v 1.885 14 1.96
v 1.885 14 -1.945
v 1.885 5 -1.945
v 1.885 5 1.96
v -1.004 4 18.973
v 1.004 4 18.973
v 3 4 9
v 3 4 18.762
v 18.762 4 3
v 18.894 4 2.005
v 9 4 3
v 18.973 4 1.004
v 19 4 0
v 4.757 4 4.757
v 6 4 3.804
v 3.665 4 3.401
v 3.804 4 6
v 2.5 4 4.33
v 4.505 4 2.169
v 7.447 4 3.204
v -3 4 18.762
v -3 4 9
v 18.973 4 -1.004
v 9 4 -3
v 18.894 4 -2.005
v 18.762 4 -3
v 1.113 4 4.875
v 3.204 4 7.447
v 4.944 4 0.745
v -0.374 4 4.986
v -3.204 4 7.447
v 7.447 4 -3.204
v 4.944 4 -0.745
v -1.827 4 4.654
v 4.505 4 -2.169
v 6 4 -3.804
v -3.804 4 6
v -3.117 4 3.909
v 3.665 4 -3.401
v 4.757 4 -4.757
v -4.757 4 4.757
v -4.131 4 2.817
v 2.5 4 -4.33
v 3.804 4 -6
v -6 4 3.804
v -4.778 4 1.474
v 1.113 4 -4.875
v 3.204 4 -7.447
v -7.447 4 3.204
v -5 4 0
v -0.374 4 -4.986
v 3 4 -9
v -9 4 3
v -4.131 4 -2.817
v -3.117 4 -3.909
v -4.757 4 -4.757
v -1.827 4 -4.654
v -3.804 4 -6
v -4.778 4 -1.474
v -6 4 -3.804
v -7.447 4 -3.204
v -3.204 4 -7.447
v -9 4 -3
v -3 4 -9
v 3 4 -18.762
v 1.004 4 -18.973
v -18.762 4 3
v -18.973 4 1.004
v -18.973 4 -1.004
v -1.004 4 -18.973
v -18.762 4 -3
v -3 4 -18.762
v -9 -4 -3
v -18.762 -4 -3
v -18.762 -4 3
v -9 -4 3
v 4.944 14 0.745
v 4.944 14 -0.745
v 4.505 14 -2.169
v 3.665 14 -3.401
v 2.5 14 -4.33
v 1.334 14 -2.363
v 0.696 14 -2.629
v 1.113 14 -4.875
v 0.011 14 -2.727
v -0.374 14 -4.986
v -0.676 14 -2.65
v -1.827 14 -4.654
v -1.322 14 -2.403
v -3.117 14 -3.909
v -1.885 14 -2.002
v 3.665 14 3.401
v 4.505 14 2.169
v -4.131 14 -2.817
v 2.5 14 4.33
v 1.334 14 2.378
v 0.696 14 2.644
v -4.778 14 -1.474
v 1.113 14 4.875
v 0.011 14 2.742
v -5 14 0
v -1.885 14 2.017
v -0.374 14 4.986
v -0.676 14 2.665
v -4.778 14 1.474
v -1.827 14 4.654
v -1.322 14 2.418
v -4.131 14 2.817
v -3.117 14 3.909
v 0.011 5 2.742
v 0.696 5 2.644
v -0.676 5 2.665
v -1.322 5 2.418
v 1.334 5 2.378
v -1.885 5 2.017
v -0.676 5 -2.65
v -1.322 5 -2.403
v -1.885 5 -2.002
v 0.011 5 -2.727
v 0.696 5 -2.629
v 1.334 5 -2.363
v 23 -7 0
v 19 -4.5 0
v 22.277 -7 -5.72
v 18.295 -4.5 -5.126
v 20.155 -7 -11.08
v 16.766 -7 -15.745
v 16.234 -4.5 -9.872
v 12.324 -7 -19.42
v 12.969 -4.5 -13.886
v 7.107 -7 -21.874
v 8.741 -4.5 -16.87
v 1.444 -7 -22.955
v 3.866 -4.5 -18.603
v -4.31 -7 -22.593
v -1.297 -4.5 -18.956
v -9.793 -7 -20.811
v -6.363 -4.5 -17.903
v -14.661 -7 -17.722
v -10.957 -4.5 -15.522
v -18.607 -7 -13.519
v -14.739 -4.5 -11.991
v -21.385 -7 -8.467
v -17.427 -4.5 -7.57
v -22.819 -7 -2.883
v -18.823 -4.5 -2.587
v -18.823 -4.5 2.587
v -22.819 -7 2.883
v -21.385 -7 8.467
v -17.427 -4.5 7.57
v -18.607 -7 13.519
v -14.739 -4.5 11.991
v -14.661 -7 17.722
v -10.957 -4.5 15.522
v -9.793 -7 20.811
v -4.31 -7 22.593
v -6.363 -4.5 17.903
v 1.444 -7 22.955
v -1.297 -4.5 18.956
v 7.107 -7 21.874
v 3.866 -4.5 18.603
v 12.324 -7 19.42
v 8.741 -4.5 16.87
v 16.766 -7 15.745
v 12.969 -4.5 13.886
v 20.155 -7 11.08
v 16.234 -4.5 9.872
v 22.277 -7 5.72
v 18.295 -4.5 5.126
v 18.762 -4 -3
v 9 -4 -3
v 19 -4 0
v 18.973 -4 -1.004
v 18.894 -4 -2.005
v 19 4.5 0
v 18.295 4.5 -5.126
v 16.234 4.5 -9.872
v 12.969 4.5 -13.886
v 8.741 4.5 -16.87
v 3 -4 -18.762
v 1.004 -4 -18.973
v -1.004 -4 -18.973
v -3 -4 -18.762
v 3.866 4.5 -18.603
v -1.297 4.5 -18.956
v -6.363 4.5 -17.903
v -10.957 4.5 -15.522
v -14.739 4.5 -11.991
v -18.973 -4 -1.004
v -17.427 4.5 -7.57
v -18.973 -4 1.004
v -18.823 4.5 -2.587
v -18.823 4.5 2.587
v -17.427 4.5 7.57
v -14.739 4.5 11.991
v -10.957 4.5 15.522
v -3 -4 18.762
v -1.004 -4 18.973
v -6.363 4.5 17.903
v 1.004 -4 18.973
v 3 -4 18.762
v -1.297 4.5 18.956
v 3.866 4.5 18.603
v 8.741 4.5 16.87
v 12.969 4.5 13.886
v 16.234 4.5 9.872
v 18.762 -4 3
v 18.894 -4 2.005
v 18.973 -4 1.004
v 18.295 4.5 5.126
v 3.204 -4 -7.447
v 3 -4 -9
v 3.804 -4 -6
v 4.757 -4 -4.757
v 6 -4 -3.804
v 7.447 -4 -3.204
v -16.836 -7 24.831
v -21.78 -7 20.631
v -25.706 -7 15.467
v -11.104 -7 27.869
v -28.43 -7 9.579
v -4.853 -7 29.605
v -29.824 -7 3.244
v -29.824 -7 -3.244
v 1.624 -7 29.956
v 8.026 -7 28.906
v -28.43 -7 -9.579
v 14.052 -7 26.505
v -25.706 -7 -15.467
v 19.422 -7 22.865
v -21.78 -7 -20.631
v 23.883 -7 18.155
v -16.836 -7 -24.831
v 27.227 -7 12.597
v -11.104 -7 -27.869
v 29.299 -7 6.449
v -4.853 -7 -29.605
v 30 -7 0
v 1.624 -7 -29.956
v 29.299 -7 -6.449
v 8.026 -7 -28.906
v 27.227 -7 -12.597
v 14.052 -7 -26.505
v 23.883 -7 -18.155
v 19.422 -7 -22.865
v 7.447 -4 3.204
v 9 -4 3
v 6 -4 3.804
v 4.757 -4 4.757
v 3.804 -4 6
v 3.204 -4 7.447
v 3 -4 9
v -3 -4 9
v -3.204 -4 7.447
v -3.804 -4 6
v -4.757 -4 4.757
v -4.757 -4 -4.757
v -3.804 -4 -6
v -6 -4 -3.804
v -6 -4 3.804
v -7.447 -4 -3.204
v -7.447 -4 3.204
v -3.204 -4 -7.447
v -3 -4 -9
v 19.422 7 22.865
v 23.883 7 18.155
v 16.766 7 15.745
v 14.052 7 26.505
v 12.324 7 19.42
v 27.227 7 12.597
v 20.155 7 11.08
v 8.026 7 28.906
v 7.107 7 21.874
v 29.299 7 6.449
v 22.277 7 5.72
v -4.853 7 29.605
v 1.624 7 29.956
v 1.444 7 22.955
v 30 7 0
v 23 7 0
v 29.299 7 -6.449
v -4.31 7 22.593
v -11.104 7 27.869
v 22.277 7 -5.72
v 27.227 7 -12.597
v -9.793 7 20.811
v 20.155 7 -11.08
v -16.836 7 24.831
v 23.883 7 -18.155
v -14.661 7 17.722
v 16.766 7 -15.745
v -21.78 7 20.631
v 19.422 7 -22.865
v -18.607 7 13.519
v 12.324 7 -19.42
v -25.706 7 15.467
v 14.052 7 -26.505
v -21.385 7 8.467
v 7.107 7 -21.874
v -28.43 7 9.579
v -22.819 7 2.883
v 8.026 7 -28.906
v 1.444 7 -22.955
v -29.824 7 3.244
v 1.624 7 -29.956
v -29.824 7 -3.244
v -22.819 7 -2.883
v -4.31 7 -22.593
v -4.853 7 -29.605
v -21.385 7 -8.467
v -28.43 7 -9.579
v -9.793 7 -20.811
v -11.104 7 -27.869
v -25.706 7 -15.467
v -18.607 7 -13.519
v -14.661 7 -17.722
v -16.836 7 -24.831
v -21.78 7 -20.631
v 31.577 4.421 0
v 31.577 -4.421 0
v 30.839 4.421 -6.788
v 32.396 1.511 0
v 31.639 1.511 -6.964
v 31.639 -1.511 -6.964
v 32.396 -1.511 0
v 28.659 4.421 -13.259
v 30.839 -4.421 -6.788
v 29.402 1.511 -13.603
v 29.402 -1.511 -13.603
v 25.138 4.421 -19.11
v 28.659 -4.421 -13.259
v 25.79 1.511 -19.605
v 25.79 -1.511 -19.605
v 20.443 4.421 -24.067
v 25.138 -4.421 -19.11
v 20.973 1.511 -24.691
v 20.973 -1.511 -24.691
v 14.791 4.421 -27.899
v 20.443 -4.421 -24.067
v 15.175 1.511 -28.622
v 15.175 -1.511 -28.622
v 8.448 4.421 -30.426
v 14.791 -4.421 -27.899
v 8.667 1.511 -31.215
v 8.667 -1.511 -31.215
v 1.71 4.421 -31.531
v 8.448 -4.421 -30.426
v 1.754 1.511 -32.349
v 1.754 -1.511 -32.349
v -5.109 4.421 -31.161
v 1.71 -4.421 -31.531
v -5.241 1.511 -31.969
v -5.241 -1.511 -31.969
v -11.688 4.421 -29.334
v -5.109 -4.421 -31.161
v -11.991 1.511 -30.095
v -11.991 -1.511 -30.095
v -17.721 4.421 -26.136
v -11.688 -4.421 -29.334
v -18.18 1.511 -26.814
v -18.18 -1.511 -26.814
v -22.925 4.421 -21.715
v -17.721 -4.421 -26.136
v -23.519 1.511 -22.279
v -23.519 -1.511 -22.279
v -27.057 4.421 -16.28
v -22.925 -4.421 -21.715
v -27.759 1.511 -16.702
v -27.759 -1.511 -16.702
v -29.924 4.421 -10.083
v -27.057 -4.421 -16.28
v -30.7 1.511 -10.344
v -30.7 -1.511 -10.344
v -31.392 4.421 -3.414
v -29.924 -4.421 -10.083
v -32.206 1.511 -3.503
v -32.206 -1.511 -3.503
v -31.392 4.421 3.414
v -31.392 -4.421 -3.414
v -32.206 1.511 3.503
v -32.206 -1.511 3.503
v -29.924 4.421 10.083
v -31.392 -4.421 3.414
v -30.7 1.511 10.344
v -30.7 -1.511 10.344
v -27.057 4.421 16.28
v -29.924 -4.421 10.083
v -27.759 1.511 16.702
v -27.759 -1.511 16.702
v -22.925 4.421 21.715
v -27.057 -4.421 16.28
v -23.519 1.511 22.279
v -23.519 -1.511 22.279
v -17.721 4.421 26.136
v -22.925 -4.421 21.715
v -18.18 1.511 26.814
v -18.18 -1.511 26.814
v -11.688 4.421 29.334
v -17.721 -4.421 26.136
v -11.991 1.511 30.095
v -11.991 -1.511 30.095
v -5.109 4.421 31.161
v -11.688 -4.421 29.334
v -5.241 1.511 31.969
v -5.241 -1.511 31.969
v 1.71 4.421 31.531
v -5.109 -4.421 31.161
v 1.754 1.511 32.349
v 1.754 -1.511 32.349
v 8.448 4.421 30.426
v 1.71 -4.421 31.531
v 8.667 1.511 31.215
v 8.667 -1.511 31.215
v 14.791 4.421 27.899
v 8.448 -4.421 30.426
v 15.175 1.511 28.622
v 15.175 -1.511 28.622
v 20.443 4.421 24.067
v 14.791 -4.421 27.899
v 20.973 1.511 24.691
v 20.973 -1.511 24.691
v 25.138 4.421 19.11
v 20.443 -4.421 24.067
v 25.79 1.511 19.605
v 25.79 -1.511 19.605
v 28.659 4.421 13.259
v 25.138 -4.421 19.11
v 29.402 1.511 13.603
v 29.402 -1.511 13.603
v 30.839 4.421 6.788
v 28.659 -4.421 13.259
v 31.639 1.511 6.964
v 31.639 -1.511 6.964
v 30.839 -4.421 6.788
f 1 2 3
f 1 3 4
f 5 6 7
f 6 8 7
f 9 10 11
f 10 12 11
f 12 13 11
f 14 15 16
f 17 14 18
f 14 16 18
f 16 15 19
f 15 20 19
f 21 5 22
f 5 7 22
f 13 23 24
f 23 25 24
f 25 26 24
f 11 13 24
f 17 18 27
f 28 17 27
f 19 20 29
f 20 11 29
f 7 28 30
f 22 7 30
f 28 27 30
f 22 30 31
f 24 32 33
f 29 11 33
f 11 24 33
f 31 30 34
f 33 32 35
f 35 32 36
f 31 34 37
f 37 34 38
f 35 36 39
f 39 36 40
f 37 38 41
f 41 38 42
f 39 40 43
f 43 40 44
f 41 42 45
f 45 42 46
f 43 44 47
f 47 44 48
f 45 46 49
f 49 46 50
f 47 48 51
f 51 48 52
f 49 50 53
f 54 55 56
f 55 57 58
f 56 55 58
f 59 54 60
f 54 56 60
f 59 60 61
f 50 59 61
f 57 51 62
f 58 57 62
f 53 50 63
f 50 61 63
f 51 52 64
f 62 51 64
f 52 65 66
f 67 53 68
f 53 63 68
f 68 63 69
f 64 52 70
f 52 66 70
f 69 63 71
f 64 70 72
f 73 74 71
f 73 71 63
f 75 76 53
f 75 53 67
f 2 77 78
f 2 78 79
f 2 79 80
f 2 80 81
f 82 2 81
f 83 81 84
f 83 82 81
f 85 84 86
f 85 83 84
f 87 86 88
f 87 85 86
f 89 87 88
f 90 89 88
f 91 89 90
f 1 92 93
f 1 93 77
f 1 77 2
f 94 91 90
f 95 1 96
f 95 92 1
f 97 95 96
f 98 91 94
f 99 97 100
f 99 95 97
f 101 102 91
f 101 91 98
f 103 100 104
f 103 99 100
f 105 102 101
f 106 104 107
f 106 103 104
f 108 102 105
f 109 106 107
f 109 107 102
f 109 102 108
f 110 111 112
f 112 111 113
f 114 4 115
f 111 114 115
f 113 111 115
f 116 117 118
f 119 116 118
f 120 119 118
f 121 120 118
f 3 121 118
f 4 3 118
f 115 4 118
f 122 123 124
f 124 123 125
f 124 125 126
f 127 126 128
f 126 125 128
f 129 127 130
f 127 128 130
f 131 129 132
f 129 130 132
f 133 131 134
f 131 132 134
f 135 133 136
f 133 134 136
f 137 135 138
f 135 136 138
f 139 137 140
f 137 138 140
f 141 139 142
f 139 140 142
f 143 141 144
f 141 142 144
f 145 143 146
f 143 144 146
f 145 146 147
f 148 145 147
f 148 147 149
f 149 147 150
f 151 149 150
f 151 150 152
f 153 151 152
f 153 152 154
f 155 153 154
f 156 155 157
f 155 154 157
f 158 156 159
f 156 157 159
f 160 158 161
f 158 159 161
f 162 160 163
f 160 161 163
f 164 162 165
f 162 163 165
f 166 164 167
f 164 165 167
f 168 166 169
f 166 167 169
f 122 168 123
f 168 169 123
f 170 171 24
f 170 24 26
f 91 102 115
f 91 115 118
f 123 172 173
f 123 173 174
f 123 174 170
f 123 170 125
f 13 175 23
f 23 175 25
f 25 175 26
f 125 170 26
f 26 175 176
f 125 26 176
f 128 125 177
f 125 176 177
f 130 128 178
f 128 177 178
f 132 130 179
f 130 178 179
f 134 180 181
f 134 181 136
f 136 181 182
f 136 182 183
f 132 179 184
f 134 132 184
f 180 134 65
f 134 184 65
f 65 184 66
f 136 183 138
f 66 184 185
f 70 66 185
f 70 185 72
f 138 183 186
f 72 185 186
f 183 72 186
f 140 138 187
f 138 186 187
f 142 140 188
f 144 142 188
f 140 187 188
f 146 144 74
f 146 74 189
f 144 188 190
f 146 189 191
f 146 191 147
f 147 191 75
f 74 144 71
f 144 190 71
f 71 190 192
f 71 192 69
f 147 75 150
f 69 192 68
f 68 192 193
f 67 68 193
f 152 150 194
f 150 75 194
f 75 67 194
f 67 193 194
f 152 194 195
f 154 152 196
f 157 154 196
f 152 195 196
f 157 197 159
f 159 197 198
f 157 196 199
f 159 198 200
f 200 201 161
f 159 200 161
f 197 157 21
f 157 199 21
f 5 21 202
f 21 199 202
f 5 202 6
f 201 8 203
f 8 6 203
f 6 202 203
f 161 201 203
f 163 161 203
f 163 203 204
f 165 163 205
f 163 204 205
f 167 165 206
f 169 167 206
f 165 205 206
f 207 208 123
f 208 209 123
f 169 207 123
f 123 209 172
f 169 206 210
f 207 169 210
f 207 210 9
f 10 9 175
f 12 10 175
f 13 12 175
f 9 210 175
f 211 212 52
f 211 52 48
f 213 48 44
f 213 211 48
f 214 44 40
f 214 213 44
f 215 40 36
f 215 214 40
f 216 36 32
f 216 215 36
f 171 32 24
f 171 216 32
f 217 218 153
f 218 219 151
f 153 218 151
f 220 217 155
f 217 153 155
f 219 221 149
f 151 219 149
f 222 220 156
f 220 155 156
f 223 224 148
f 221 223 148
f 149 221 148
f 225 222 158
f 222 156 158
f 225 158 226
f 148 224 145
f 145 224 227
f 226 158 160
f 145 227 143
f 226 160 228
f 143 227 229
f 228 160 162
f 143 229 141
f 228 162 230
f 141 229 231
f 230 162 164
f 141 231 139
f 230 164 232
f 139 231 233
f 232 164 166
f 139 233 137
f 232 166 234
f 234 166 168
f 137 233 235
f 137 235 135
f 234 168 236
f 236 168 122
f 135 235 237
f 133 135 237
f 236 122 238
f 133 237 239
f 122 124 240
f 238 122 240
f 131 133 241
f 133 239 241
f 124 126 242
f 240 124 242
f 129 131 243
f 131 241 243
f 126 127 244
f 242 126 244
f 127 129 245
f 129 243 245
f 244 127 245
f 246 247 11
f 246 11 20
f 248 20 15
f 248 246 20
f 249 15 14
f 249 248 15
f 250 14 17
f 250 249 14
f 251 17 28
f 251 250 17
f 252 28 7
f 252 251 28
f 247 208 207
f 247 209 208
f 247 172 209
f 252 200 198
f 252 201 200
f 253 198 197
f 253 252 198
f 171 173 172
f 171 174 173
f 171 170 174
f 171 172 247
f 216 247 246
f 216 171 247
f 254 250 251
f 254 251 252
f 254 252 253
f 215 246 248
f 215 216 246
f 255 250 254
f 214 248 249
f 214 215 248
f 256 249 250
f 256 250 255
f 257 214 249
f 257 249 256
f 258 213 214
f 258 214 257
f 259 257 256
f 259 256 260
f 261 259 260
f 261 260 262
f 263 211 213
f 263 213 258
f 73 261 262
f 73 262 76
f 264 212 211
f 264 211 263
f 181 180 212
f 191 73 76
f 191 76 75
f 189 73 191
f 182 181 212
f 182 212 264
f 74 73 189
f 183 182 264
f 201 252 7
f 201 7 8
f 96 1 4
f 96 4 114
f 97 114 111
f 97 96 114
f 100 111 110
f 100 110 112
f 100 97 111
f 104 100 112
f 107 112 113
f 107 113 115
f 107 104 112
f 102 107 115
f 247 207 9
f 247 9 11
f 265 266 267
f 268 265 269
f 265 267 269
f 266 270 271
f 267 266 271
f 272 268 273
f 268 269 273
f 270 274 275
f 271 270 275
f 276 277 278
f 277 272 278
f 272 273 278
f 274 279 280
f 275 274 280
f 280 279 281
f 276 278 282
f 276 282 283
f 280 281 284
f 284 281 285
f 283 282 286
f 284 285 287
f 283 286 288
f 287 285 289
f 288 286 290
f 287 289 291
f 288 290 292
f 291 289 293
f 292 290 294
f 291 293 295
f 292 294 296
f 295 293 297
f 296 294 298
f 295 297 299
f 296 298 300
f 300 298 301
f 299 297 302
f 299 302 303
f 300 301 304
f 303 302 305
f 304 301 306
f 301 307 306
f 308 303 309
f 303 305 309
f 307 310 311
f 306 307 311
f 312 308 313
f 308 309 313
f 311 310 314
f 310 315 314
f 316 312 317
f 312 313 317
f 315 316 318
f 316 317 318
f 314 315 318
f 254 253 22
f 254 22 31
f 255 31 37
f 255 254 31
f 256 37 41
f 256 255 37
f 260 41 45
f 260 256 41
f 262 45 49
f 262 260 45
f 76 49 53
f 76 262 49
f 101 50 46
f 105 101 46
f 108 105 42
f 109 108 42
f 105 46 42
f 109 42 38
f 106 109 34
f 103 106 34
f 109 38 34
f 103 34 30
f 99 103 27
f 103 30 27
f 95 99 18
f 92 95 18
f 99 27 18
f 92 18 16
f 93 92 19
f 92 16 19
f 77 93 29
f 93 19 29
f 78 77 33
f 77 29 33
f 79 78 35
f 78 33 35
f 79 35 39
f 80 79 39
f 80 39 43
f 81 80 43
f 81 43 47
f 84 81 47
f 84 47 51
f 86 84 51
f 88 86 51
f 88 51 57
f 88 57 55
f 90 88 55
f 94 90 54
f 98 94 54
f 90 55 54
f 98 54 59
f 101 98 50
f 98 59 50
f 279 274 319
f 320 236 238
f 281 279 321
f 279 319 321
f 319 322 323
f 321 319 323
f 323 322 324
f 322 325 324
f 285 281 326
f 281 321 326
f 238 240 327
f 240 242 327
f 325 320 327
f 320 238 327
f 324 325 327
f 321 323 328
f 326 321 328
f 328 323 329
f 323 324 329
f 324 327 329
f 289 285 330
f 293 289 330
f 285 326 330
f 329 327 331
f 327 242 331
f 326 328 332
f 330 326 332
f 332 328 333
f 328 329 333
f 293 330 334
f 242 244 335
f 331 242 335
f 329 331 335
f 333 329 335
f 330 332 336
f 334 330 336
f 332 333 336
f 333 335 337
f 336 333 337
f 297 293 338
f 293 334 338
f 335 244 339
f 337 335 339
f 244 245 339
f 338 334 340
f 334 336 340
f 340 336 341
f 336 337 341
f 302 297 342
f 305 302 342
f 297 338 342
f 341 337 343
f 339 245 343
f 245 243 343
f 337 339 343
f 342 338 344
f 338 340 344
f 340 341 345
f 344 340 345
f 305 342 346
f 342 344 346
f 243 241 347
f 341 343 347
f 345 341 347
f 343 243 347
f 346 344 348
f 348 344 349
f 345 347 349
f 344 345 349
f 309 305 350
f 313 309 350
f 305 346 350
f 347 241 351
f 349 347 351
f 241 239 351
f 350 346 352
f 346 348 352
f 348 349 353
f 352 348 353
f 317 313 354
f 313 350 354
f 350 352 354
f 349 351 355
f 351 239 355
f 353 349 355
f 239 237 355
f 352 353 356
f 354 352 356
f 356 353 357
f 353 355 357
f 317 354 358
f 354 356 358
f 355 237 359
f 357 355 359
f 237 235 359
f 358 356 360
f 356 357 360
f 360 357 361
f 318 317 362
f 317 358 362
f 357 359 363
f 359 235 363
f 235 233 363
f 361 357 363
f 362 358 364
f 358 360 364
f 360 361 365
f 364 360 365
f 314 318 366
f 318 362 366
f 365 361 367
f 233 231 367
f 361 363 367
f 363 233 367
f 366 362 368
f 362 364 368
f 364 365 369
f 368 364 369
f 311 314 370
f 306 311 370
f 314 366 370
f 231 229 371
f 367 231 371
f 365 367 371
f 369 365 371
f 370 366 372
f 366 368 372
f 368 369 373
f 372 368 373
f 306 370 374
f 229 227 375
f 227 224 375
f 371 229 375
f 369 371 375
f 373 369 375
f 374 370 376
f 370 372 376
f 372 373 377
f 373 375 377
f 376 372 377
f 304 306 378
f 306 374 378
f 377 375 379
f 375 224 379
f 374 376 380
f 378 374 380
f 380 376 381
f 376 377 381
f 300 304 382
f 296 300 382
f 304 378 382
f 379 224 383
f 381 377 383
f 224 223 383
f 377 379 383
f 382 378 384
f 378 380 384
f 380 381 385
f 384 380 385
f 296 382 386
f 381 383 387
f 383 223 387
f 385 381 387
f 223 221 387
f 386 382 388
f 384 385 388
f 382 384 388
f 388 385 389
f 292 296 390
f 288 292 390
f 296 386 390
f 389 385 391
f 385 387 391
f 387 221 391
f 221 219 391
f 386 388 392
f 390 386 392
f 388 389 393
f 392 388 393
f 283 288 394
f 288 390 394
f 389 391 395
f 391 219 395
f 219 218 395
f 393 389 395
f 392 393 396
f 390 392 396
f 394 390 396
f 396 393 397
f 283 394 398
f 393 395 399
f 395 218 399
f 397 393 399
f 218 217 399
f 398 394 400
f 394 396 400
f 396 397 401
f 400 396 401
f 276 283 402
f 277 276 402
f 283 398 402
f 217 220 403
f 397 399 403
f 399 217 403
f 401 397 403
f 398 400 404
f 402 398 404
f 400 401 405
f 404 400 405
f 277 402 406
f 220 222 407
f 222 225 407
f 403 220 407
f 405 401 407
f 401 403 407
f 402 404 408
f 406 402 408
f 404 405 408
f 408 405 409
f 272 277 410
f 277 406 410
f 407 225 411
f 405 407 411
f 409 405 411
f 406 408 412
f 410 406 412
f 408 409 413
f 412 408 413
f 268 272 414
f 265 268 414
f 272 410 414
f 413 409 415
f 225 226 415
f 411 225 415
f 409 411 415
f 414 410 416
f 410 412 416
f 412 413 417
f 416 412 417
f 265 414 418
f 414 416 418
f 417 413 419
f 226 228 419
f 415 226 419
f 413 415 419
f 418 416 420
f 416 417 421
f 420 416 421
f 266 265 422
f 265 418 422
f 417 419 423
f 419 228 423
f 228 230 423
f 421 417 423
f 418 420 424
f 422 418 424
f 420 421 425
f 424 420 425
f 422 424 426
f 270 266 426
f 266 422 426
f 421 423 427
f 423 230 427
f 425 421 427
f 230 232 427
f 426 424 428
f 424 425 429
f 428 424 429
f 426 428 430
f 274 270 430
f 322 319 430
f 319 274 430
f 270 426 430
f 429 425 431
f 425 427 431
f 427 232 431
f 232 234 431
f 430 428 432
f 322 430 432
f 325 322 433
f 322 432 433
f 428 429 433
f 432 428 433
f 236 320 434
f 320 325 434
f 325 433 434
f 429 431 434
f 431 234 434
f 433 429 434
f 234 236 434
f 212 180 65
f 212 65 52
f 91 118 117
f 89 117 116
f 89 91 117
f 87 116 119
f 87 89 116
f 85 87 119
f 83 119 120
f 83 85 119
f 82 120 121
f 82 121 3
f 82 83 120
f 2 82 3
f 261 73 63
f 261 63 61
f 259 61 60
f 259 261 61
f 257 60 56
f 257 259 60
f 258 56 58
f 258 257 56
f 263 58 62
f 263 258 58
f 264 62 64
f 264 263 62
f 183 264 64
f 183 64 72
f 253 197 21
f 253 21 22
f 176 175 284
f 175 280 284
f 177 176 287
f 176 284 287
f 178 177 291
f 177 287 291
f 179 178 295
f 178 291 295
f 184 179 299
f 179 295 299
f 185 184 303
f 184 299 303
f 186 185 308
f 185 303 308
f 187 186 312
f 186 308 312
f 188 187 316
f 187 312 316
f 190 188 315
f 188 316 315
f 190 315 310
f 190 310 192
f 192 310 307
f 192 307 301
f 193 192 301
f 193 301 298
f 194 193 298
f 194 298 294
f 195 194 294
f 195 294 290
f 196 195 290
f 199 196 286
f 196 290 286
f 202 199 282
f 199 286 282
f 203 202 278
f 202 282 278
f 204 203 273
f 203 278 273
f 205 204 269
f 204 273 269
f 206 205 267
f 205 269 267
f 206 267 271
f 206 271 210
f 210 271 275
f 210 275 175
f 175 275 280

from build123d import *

# Parameters (mm, degrees)
BOSS_EXTRUDE1_DEPTH      = 4
BOSS_EXTRUDE1_DEPTH_BACK = 4
SKETCH4_R                = 5
BOSS_EXTRUDE2_DEPTH      = 10
CUT_EXTRUDE1_DEPTH       = 9


with BuildPart() as part:
    # Sketch2 → Revolve1 (revolve)
    with BuildSketch(Plane.XY, mode=Mode.PRIVATE) as revolve1_sk:
        with BuildLine():
            Line((-19, -4.5), (-19, 4.5))
            Line((-19, 4.5), (-23, 7))
            Line((-23, 7), (-30, 7))
            ThreePointArc((-30, 7), (-32.5, 0), (-30, -7))
            Line((-30, -7), (-23, -7))
            Line((-23, -7), (-19, -4.5))
        make_face()
    revolve(revolve1_sk.sketch.rotate(Axis((0, -7, 0), (0, 1, 0)), 180), axis=Axis((0, -7, 0), (0, 1, 0)))

    # Sketch3 → Boss-Extrude1 (add, two sides: drawn at the far end of the back side and taken through both)
    with BuildSketch(Plane(origin=(0, 0, 0), x_dir=(1, 0, 0), z_dir=(0, 1, 0)).offset(-BOSS_EXTRUDE1_DEPTH_BACK)):
        with BuildLine():
            Line((9, 3), (25, 3))
            Line((25, 3), (25, -3))
            Line((25, -3), (9, -3))
            ThreePointArc((9, -3), (4.757359313, -4.757359313), (3, -9))
            Line((3, -9), (3, -25))
            Line((3, -25), (-3, -25))
            Line((-3, -25), (-3, -9))
            ThreePointArc((-3, -9), (-4.757359313, -4.757359313), (-9, -3))
            Line((-9, -3), (-25, -3))
            Line((-25, -3), (-25, 3))
            Line((-25, 3), (-9, 3))
            ThreePointArc((-9, 3), (-4.757359313, 4.757359313), (-3, 9))
            Line((-3, 9), (-3, 25))
            Line((-3, 25), (3, 25))
            Line((3, 25), (3, 9))
            ThreePointArc((3, 9), (4.757359313, 4.757359313), (9, 3))
        make_face()
    extrude(amount=BOSS_EXTRUDE1_DEPTH + BOSS_EXTRUDE1_DEPTH_BACK)

    # Sketch4 → Boss-Extrude2 (add)
    with BuildSketch(Plane(origin=(0, 4, 0), x_dir=(1, 0, 0), z_dir=(0, 1, 0))):
        with Locations(Location((0, 0, 0), (0, 0, 180))):
            Circle(SKETCH4_R)
    extrude(amount=BOSS_EXTRUDE2_DEPTH)

    # Sketch5 → Cut-Extrude1 (cut)
    with BuildSketch(Plane(origin=(0, 14, 0), x_dir=(1, 0, 0), z_dir=(0, 1, 0))):
        with BuildLine():
            Line((-1.885, -2.017231601), (-1.885, 2.002198265))
            ThreePointArc((-1.885, 2.002198265), (0.011383629, 2.727171226), (1.885, 1.945238778))
            Line((1.885, 1.945238778), (1.885, -1.960272114))
            ThreePointArc((1.885, -1.960272114), (0.011383629, -2.742204562), (-1.885, -2.017231601))
        make_face()
    extrude(amount=-CUT_EXTRUDE1_DEPTH, mode=Mode.SUBTRACT)


solid = part.part
